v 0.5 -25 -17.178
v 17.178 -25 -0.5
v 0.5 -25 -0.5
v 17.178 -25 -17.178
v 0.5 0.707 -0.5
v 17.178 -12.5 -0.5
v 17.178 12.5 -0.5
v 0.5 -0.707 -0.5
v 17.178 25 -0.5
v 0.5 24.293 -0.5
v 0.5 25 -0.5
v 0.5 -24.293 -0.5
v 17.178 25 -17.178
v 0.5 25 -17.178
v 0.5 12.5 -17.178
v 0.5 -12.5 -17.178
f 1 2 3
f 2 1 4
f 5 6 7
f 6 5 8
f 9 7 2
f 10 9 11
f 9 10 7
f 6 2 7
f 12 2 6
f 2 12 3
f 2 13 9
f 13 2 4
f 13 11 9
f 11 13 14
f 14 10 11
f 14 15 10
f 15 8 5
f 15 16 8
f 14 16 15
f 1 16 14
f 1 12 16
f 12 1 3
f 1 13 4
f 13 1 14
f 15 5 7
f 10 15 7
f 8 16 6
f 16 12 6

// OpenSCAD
length = 50;
deduction = 1;

module one_stem (deduct) {
  rotate (45) cube ([
    length / sqrt(8) - deduct,
    length / sqrt(8) - deduct,
    length
  ], center=true);
}

module one_axis_full (deduct) {
  translate ([0, -length/4, 0]) one_stem (deduct);
  translate ([0, length/4, 0]) one_stem (deduct);
}

module one_axis () {
  difference () {
    one_axis_full (deduction);
    rotate ([90, 0, 90]) one_axis_full (0);
  }
}

// uncomment this to see what the full puzzle looks like
//one_axis ();
//rotate ([90, 0, 90]) one_axis ();
//rotate ([90, 90, 0]) one_axis ();

rotate ([90, 135, 0])
intersection () {
  translate ([-100, 0, -100]) cube (200);
  one_axis ();
}
